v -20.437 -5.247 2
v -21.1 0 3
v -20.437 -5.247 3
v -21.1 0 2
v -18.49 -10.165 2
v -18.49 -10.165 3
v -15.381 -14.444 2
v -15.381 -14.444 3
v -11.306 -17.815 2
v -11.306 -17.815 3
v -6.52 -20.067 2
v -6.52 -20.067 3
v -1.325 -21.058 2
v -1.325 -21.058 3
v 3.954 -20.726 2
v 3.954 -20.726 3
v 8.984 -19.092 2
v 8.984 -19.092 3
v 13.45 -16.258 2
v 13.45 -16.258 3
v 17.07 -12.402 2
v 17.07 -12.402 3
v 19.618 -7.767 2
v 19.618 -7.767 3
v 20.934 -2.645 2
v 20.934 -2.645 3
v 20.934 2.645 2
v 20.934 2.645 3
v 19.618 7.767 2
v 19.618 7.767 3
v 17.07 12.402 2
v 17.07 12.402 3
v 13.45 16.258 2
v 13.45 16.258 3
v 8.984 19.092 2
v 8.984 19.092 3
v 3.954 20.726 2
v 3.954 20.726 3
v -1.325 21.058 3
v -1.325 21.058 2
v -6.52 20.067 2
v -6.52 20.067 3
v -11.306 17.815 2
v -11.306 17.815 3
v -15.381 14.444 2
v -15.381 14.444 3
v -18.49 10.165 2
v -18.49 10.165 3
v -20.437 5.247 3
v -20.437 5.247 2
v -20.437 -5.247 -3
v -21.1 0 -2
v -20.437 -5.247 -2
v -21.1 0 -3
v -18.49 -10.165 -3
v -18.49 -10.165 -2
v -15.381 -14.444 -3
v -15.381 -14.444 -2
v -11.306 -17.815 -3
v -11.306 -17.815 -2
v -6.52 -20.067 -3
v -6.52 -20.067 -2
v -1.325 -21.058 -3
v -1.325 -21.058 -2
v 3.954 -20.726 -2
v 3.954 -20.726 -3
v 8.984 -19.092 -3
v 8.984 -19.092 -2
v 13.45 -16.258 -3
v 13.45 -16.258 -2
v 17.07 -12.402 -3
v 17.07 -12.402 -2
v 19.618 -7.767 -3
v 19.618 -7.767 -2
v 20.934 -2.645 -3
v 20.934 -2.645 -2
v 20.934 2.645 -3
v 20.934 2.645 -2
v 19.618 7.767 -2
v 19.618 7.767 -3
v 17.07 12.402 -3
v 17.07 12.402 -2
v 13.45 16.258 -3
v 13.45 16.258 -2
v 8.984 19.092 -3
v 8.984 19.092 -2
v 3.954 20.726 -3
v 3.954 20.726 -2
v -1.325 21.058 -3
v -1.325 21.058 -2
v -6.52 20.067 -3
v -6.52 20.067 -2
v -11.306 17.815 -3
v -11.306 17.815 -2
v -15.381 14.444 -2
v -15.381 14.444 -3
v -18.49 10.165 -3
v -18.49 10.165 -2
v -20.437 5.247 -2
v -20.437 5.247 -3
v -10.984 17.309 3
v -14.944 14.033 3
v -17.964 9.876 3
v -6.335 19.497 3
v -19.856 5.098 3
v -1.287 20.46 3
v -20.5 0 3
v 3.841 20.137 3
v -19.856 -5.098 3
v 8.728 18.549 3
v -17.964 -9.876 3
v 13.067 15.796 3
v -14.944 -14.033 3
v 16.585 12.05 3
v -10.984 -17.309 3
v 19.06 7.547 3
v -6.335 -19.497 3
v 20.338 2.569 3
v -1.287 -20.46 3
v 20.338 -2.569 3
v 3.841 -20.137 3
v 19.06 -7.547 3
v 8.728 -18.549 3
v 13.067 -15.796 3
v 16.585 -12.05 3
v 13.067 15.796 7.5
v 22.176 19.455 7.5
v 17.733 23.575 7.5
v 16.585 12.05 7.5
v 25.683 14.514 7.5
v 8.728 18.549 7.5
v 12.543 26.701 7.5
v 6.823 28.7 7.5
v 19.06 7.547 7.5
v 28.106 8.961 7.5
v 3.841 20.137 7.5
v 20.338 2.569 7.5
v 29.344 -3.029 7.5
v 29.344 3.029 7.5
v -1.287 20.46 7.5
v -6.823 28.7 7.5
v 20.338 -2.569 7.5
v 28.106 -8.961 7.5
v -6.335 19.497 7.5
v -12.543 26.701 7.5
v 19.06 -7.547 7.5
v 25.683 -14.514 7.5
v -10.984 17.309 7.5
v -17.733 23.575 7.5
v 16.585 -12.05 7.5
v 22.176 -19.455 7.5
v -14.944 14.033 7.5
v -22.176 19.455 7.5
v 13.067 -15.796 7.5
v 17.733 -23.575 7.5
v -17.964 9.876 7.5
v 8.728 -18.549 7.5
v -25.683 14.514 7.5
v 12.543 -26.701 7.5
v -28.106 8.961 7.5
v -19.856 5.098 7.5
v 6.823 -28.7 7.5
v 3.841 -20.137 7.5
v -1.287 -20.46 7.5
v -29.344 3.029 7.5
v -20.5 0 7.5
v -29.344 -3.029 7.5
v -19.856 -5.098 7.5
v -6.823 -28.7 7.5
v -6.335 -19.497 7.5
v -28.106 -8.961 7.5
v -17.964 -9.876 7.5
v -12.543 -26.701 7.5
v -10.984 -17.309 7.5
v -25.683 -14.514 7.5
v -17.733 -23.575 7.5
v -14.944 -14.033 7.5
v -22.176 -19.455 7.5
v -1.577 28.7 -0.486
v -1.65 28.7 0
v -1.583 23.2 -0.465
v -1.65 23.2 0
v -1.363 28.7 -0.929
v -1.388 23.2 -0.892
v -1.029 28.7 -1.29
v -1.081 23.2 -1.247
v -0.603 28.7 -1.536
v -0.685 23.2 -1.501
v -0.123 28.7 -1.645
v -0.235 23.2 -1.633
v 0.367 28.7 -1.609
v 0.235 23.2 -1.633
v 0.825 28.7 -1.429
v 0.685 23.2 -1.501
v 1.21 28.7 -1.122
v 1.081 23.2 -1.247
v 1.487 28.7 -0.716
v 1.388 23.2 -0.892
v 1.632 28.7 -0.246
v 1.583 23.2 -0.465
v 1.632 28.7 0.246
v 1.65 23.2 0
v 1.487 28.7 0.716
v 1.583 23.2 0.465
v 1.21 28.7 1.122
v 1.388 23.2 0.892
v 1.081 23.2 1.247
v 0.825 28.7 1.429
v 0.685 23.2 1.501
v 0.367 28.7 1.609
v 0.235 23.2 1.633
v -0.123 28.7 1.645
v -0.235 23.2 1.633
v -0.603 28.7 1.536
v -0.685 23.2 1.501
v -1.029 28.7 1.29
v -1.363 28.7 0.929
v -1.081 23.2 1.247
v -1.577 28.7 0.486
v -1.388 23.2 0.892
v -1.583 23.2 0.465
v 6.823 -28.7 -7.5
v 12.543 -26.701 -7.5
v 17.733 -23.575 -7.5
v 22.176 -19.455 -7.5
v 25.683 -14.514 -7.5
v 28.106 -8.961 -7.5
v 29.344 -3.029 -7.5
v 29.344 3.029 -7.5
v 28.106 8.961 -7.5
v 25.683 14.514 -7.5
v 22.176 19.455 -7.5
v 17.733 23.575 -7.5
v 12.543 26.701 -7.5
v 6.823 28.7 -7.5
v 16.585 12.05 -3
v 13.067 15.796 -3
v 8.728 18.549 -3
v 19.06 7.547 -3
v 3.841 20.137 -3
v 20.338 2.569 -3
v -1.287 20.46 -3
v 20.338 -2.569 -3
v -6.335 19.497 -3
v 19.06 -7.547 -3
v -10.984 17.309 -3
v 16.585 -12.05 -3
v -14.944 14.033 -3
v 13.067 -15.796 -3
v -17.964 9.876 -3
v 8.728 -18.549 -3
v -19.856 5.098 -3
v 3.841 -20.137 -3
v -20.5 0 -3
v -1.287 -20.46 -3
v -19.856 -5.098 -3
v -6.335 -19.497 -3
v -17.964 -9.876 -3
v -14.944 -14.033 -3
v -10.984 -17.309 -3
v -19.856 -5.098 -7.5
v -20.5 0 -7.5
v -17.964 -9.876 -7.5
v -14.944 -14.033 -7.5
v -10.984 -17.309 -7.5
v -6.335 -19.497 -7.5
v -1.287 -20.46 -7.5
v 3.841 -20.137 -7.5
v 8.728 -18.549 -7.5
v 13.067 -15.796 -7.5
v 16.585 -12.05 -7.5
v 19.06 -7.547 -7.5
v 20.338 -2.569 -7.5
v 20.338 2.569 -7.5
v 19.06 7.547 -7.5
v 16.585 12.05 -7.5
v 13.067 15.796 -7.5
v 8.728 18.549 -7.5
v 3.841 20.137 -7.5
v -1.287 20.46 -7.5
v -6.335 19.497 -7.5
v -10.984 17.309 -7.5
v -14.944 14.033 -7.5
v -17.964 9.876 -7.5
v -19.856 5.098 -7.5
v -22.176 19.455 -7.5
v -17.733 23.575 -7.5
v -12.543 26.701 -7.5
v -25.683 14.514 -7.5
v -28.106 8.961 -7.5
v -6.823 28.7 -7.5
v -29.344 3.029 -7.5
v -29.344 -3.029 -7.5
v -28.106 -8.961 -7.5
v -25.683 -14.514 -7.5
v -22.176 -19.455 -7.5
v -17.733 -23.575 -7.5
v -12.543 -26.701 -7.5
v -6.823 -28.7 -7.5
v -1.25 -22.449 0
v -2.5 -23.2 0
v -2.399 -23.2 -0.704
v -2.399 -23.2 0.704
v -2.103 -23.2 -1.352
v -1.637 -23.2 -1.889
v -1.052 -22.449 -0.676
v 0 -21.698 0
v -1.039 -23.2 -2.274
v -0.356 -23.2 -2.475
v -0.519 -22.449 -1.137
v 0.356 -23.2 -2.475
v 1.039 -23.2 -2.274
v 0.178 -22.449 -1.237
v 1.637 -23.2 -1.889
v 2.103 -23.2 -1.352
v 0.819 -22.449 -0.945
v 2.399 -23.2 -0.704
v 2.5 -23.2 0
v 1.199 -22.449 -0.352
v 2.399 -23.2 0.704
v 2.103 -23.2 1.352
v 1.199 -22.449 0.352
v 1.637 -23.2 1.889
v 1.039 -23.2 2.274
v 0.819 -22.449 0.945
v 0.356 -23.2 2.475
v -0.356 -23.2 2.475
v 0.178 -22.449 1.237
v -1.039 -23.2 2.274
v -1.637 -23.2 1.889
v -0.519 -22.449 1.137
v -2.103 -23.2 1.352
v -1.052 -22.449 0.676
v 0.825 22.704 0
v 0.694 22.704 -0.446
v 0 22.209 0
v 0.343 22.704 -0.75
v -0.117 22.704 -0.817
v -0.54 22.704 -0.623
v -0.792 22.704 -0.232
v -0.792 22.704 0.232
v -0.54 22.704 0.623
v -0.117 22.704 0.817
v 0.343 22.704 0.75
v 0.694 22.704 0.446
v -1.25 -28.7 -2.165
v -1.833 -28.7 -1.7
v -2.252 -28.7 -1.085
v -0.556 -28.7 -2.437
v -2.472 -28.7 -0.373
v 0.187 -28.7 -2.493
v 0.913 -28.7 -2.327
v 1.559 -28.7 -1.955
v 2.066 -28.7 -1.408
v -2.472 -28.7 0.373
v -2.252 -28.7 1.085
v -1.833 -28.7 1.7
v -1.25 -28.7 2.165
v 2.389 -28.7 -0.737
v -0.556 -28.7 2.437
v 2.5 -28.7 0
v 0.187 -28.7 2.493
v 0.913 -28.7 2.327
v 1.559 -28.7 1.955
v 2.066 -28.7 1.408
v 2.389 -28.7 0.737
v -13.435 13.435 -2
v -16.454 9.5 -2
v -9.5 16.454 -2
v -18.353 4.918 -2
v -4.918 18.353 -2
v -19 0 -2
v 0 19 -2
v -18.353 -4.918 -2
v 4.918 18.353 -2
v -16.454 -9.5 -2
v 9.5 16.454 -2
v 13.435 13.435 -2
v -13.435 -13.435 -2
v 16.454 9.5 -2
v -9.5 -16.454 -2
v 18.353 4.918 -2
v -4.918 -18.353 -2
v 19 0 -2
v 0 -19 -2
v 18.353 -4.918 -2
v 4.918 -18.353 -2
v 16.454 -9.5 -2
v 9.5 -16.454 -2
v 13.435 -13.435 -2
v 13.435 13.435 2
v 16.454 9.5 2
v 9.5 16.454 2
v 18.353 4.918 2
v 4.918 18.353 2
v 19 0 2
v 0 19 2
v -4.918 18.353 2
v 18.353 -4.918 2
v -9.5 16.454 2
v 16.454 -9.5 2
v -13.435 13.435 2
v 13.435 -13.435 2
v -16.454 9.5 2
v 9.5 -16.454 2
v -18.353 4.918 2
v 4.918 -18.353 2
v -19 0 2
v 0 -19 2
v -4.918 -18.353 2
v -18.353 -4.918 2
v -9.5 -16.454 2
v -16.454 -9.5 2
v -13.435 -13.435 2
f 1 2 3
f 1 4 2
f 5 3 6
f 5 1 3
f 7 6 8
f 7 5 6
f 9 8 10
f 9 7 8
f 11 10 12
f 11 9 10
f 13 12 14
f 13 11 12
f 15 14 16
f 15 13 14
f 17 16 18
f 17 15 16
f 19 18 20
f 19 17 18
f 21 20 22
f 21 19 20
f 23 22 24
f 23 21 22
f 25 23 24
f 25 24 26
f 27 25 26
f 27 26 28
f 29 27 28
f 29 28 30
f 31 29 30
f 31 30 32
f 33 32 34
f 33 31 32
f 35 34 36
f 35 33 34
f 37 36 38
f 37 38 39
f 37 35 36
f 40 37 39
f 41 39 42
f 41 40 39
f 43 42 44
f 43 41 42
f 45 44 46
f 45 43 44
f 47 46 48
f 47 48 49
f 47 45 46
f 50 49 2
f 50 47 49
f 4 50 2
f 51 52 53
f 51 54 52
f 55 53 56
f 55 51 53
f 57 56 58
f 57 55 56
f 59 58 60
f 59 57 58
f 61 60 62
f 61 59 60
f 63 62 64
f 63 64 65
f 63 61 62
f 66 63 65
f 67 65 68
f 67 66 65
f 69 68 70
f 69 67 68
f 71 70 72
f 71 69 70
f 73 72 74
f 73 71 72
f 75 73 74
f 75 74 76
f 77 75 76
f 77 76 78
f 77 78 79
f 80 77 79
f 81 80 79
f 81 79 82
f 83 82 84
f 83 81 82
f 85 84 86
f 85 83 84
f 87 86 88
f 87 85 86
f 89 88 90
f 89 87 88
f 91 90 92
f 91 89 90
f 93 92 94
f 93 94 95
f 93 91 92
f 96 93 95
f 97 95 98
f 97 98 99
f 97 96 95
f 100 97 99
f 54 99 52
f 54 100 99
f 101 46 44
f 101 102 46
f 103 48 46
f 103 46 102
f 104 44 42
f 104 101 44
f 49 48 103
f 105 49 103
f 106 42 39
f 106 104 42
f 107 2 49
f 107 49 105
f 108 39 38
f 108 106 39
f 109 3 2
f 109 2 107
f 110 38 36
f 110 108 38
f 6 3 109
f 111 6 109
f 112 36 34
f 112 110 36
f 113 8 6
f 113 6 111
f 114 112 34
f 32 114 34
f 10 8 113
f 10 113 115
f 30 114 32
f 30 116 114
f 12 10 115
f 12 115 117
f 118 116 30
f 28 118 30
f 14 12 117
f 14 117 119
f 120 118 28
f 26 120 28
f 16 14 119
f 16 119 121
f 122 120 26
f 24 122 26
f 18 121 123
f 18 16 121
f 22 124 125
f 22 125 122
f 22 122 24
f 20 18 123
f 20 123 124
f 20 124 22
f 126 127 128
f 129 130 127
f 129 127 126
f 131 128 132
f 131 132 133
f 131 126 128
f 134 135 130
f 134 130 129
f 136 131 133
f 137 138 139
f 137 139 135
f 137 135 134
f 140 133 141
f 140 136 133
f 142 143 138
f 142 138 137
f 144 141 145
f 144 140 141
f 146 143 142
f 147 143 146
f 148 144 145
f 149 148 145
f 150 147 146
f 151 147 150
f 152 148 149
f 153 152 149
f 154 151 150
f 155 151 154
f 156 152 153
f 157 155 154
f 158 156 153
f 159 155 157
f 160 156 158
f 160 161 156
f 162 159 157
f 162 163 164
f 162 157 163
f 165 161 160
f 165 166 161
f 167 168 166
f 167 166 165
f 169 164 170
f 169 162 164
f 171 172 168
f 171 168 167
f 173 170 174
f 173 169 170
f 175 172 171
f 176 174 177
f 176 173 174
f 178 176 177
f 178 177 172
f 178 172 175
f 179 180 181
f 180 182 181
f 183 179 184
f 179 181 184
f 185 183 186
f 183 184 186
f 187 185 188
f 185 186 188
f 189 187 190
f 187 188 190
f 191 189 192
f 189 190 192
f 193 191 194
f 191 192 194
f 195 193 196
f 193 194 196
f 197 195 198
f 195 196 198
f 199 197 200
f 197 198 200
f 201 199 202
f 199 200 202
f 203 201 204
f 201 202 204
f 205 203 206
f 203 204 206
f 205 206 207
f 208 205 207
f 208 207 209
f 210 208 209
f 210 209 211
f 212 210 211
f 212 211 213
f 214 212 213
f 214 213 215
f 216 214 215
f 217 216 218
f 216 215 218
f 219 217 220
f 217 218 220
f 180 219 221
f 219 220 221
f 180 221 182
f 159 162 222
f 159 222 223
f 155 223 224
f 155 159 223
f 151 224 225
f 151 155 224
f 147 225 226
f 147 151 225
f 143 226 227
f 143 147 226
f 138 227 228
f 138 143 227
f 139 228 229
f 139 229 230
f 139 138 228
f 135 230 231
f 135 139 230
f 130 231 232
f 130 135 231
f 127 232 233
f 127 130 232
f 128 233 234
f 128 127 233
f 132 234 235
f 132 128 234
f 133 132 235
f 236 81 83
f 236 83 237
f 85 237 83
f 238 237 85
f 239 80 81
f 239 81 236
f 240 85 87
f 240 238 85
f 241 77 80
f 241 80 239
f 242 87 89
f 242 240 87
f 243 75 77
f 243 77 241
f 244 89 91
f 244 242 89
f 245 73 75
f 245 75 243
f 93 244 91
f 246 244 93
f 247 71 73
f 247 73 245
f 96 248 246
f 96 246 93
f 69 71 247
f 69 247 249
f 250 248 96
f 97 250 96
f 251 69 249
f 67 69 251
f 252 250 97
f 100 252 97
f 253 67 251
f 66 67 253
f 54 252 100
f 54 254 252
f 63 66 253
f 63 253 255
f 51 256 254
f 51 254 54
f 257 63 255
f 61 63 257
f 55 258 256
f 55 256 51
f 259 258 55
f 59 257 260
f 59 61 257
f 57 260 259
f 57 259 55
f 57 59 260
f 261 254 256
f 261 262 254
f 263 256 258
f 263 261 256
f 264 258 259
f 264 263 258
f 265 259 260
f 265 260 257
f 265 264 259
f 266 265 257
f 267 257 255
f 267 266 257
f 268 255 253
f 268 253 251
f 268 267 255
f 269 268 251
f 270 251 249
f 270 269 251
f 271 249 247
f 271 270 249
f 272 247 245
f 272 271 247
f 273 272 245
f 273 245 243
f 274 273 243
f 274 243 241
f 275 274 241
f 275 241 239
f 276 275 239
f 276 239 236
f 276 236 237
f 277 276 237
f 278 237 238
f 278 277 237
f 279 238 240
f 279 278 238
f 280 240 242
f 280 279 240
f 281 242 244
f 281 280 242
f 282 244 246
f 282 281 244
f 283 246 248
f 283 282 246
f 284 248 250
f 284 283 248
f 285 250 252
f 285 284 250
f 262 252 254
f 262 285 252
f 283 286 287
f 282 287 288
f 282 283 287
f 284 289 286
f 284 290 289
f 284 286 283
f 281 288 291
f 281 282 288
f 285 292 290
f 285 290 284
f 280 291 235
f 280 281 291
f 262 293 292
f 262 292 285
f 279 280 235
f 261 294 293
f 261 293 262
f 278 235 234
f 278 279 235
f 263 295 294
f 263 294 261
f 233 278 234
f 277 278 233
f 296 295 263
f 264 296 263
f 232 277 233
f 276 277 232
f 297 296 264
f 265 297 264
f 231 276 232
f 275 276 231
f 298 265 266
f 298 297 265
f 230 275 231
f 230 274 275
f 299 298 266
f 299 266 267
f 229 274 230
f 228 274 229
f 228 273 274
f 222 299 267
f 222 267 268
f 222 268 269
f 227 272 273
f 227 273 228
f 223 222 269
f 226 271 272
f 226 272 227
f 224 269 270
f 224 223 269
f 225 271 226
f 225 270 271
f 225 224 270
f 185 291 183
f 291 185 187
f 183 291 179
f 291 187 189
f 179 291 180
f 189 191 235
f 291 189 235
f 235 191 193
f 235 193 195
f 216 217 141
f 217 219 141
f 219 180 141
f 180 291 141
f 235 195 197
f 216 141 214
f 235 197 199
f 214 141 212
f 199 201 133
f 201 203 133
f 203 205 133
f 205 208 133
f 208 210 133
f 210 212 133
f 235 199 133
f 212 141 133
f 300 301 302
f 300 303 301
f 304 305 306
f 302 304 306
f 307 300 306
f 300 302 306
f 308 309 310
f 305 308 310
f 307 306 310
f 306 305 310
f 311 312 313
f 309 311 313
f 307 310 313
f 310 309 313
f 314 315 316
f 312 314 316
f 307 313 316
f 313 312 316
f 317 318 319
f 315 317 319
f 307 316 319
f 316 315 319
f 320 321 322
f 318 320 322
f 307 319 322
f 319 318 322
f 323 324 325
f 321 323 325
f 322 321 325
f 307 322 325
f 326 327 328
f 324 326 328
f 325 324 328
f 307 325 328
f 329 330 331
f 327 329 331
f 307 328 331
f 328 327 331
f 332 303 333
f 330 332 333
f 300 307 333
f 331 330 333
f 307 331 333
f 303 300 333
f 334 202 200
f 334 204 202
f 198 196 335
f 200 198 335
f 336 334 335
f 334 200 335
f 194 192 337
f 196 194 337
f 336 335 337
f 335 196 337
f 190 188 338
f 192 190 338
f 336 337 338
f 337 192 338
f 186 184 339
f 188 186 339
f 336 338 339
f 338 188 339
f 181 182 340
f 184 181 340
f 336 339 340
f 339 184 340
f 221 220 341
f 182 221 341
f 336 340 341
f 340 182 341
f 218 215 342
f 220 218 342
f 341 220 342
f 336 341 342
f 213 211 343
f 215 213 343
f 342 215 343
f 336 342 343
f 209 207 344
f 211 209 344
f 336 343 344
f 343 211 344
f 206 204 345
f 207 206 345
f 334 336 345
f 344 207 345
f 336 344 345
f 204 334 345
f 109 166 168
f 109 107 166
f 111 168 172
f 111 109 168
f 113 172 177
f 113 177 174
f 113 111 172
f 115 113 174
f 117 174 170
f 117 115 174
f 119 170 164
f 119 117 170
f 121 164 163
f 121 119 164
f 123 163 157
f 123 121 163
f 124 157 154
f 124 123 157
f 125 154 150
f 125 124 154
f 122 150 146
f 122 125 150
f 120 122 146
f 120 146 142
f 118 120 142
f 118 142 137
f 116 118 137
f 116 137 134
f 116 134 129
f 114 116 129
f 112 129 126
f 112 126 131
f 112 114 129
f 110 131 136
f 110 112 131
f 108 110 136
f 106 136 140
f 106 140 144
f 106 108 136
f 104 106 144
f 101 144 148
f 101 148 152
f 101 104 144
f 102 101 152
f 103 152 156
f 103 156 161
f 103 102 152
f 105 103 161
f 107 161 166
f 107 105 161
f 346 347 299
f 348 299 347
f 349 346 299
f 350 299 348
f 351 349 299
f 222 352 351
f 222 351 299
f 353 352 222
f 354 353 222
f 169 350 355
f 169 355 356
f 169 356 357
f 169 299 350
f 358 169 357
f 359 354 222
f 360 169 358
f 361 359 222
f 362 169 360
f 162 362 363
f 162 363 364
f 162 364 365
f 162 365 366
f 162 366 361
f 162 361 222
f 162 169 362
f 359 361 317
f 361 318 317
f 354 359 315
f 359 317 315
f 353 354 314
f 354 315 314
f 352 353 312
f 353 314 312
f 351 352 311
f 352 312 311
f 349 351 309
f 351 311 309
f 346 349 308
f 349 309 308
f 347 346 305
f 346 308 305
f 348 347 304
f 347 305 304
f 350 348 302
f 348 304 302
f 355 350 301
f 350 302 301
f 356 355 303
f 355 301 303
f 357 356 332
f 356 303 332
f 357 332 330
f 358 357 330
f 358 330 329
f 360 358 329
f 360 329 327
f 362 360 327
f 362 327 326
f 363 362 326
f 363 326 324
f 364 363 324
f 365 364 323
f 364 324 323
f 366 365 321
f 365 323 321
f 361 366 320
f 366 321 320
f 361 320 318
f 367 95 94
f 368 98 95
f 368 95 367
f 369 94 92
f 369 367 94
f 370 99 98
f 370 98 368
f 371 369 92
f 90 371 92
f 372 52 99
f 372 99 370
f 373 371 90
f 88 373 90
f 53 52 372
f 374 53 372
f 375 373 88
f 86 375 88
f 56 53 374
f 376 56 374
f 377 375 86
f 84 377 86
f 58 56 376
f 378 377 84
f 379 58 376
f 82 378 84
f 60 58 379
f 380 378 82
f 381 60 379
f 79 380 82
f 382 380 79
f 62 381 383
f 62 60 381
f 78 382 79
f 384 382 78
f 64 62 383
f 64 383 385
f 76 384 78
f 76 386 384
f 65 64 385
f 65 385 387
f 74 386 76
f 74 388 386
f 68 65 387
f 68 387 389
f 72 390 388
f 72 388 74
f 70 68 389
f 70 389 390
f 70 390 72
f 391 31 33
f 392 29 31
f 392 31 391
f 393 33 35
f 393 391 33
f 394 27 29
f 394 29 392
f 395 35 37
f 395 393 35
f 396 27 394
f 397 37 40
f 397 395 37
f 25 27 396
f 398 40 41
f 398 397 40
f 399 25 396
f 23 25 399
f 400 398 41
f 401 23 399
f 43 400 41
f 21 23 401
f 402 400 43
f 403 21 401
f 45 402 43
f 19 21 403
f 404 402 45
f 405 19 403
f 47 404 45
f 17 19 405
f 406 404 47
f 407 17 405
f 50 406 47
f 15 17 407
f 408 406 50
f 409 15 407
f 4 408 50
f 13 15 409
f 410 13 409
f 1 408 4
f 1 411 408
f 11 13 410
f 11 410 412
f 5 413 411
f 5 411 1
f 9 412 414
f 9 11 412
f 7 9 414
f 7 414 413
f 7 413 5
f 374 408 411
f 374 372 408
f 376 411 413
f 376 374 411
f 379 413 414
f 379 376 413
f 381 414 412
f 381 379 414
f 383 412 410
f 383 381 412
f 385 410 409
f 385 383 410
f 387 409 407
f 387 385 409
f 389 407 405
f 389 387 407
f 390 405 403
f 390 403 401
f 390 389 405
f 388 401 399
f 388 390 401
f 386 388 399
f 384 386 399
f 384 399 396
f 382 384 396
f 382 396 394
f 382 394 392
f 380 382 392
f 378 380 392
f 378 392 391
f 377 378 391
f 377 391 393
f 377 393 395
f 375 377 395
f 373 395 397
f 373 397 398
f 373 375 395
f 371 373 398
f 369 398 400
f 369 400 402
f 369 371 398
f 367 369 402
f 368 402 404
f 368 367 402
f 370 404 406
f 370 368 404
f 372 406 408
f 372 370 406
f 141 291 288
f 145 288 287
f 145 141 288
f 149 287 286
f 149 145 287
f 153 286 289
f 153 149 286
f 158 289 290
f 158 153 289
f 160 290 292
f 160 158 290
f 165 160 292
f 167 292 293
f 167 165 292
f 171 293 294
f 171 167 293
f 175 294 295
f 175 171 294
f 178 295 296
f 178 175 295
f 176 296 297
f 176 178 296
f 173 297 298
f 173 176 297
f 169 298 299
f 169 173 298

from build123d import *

# Parameters (mm, degrees)
SKETCH_2_W             = 64.02174429
SKETCH_2_H             = 9.248919907
CUT_EXTRUDE_1_DEPTH    = 49
HOLE_WIZARD_M4_2_D     = 3.3
HOLE_WIZARD_M4_2_DEPTH = 5.5
HOLE_WIZARD_M4_2_TIP   = 0.991420021
HOLE_WIZARD_M6_2_D     = 5
HOLE_WIZARD_M6_2_DEPTH = 5.5
HOLE_WIZARD_M6_2_TIP   = 1.502151548


with BuildPart() as part:
    # 草图1 → 旋转1 (revolve)
    with BuildSketch(Plane(origin=(0, 0, 0), x_dir=(1, 0, 0), z_dir=(0, 1, 0)), mode=Mode.PRIVATE) as revolve_1_sk:
        Polygon((29.5, 7.5), (29.5, -7.5), (20.5, -7.5), (20.5, -3), (21.1, -3), (21.1, -2), (19, -2), (19, 2), (21.1, 2), (21.1, 3), (20.5, 3), (20.5, 7.5), align=None)
    revolve(revolve_1_sk.sketch.rotate(Axis((0, 0, -31.9390681), (0, 0, 1)), 180), axis=Axis((0, 0, -31.9390681), (0, 0, 1)))  # turned: the seam where the file's is

    # 草图2 → 切除-拉伸1 (cut)
    with BuildSketch(Plane.XY.offset(7.5)):
        with Locations((-1.141100508, 33.324459954)):
            Rectangle(SKETCH_2_W, SKETCH_2_H)
        with Locations((-1.141100508, -33.324459954)):
            Rectangle(SKETCH_2_W, SKETCH_2_H)
    extrude(amount=-CUT_EXTRUDE_1_DEPTH, mode=Mode.SUBTRACT)

    # M4 螺纹孔2
    with Locations(Plane(origin=(0, 28.7, 0), x_dir=(1, 0, 0), z_dir=(0, 1, 0))):
        with Locations((0, 0)):
            Hole(HOLE_WIZARD_M4_2_D / 2, depth=HOLE_WIZARD_M4_2_DEPTH)
            with Locations((0, 0, -(HOLE_WIZARD_M4_2_DEPTH + HOLE_WIZARD_M4_2_TIP / 2))):  # 118° drill point
                Cone(0, HOLE_WIZARD_M4_2_D / 2, HOLE_WIZARD_M4_2_TIP, mode=Mode.SUBTRACT)

    # M6 螺纹孔2
    with Locations(Plane(origin=(0, -28.7, 0), x_dir=(-1, 0, 0), z_dir=(0, -1, 0))):
        with Locations((0, 0)):
            Hole(HOLE_WIZARD_M6_2_D / 2, depth=HOLE_WIZARD_M6_2_DEPTH)
            with Locations((0, 0, -(HOLE_WIZARD_M6_2_DEPTH + HOLE_WIZARD_M6_2_TIP / 2))):  # 118° drill point
                Cone(0, HOLE_WIZARD_M6_2_D / 2, HOLE_WIZARD_M6_2_TIP, mode=Mode.SUBTRACT)


solid = part.part
